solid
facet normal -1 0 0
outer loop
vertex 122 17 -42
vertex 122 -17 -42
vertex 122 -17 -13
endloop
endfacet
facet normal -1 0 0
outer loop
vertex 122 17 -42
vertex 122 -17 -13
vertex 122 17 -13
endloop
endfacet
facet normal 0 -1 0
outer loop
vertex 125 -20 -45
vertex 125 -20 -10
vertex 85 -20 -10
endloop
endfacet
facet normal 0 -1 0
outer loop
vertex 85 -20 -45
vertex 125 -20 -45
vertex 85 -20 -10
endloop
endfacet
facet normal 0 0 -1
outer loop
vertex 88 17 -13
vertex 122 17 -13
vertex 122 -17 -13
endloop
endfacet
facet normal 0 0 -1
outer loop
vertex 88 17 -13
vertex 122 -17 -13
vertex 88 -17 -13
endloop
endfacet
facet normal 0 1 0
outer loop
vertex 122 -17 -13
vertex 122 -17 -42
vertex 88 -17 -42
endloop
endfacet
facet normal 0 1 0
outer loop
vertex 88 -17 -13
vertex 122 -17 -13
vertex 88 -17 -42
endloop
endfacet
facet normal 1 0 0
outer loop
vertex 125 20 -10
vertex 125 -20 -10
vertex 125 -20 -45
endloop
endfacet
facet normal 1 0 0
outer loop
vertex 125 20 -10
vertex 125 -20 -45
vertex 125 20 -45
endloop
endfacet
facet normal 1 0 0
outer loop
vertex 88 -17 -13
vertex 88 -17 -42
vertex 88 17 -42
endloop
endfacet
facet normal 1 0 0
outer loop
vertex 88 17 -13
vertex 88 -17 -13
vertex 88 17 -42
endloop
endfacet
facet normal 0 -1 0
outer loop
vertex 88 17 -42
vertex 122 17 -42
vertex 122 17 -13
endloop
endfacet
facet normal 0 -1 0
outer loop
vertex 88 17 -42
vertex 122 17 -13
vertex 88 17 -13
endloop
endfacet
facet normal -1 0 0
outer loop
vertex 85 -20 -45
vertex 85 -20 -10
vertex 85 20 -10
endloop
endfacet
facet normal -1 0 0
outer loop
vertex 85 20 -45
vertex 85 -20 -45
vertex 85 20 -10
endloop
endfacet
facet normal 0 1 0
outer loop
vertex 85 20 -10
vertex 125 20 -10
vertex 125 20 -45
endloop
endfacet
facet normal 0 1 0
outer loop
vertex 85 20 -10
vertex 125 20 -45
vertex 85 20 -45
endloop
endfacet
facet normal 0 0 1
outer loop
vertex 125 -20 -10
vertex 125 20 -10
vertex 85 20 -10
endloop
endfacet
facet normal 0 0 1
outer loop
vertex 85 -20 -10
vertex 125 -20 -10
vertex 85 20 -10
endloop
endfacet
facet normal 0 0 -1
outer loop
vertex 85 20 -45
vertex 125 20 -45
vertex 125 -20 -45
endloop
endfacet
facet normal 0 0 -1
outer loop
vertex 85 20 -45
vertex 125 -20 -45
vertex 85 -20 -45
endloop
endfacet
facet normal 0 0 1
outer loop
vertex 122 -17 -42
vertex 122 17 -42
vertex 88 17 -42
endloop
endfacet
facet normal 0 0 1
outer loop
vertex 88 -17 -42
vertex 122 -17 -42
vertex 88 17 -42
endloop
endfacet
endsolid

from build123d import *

# Parameters (mm, degrees)
SKETCH4_W           = 40
SKETCH4_H           = 40
BOSS_EXTRUDE2_DEPTH = 35
CUT_EXTRUDE1_START  = -3
SKETCH5_W           = 34
SKETCH5_H           = 34
CUT_EXTRUDE1_DEPTH  = 29


with BuildPart() as part:
    # Sketch4 → Boss-Extrude2 (new body)
    with BuildSketch(Plane(origin=(0, 0, -10), x_dir=(-1, 0, 0), z_dir=(0, 0, -1))):
        with Locations((-105, 0)):
            Rectangle(SKETCH4_W, SKETCH4_H)
    extrude(amount=BOSS_EXTRUDE2_DEPTH)

    # Sketch5 → Cut-Extrude1 (cut)
    with BuildSketch(Plane(origin=(0, 0, -45), x_dir=(-1, 0, 0), z_dir=(0, 0, -1)).offset(CUT_EXTRUDE1_START)):
        with Locations((-105, 0)):
            Rectangle(SKETCH5_W, SKETCH5_H)
    extrude(amount=-CUT_EXTRUDE1_DEPTH, mode=Mode.SUBTRACT)


solid = part.part
